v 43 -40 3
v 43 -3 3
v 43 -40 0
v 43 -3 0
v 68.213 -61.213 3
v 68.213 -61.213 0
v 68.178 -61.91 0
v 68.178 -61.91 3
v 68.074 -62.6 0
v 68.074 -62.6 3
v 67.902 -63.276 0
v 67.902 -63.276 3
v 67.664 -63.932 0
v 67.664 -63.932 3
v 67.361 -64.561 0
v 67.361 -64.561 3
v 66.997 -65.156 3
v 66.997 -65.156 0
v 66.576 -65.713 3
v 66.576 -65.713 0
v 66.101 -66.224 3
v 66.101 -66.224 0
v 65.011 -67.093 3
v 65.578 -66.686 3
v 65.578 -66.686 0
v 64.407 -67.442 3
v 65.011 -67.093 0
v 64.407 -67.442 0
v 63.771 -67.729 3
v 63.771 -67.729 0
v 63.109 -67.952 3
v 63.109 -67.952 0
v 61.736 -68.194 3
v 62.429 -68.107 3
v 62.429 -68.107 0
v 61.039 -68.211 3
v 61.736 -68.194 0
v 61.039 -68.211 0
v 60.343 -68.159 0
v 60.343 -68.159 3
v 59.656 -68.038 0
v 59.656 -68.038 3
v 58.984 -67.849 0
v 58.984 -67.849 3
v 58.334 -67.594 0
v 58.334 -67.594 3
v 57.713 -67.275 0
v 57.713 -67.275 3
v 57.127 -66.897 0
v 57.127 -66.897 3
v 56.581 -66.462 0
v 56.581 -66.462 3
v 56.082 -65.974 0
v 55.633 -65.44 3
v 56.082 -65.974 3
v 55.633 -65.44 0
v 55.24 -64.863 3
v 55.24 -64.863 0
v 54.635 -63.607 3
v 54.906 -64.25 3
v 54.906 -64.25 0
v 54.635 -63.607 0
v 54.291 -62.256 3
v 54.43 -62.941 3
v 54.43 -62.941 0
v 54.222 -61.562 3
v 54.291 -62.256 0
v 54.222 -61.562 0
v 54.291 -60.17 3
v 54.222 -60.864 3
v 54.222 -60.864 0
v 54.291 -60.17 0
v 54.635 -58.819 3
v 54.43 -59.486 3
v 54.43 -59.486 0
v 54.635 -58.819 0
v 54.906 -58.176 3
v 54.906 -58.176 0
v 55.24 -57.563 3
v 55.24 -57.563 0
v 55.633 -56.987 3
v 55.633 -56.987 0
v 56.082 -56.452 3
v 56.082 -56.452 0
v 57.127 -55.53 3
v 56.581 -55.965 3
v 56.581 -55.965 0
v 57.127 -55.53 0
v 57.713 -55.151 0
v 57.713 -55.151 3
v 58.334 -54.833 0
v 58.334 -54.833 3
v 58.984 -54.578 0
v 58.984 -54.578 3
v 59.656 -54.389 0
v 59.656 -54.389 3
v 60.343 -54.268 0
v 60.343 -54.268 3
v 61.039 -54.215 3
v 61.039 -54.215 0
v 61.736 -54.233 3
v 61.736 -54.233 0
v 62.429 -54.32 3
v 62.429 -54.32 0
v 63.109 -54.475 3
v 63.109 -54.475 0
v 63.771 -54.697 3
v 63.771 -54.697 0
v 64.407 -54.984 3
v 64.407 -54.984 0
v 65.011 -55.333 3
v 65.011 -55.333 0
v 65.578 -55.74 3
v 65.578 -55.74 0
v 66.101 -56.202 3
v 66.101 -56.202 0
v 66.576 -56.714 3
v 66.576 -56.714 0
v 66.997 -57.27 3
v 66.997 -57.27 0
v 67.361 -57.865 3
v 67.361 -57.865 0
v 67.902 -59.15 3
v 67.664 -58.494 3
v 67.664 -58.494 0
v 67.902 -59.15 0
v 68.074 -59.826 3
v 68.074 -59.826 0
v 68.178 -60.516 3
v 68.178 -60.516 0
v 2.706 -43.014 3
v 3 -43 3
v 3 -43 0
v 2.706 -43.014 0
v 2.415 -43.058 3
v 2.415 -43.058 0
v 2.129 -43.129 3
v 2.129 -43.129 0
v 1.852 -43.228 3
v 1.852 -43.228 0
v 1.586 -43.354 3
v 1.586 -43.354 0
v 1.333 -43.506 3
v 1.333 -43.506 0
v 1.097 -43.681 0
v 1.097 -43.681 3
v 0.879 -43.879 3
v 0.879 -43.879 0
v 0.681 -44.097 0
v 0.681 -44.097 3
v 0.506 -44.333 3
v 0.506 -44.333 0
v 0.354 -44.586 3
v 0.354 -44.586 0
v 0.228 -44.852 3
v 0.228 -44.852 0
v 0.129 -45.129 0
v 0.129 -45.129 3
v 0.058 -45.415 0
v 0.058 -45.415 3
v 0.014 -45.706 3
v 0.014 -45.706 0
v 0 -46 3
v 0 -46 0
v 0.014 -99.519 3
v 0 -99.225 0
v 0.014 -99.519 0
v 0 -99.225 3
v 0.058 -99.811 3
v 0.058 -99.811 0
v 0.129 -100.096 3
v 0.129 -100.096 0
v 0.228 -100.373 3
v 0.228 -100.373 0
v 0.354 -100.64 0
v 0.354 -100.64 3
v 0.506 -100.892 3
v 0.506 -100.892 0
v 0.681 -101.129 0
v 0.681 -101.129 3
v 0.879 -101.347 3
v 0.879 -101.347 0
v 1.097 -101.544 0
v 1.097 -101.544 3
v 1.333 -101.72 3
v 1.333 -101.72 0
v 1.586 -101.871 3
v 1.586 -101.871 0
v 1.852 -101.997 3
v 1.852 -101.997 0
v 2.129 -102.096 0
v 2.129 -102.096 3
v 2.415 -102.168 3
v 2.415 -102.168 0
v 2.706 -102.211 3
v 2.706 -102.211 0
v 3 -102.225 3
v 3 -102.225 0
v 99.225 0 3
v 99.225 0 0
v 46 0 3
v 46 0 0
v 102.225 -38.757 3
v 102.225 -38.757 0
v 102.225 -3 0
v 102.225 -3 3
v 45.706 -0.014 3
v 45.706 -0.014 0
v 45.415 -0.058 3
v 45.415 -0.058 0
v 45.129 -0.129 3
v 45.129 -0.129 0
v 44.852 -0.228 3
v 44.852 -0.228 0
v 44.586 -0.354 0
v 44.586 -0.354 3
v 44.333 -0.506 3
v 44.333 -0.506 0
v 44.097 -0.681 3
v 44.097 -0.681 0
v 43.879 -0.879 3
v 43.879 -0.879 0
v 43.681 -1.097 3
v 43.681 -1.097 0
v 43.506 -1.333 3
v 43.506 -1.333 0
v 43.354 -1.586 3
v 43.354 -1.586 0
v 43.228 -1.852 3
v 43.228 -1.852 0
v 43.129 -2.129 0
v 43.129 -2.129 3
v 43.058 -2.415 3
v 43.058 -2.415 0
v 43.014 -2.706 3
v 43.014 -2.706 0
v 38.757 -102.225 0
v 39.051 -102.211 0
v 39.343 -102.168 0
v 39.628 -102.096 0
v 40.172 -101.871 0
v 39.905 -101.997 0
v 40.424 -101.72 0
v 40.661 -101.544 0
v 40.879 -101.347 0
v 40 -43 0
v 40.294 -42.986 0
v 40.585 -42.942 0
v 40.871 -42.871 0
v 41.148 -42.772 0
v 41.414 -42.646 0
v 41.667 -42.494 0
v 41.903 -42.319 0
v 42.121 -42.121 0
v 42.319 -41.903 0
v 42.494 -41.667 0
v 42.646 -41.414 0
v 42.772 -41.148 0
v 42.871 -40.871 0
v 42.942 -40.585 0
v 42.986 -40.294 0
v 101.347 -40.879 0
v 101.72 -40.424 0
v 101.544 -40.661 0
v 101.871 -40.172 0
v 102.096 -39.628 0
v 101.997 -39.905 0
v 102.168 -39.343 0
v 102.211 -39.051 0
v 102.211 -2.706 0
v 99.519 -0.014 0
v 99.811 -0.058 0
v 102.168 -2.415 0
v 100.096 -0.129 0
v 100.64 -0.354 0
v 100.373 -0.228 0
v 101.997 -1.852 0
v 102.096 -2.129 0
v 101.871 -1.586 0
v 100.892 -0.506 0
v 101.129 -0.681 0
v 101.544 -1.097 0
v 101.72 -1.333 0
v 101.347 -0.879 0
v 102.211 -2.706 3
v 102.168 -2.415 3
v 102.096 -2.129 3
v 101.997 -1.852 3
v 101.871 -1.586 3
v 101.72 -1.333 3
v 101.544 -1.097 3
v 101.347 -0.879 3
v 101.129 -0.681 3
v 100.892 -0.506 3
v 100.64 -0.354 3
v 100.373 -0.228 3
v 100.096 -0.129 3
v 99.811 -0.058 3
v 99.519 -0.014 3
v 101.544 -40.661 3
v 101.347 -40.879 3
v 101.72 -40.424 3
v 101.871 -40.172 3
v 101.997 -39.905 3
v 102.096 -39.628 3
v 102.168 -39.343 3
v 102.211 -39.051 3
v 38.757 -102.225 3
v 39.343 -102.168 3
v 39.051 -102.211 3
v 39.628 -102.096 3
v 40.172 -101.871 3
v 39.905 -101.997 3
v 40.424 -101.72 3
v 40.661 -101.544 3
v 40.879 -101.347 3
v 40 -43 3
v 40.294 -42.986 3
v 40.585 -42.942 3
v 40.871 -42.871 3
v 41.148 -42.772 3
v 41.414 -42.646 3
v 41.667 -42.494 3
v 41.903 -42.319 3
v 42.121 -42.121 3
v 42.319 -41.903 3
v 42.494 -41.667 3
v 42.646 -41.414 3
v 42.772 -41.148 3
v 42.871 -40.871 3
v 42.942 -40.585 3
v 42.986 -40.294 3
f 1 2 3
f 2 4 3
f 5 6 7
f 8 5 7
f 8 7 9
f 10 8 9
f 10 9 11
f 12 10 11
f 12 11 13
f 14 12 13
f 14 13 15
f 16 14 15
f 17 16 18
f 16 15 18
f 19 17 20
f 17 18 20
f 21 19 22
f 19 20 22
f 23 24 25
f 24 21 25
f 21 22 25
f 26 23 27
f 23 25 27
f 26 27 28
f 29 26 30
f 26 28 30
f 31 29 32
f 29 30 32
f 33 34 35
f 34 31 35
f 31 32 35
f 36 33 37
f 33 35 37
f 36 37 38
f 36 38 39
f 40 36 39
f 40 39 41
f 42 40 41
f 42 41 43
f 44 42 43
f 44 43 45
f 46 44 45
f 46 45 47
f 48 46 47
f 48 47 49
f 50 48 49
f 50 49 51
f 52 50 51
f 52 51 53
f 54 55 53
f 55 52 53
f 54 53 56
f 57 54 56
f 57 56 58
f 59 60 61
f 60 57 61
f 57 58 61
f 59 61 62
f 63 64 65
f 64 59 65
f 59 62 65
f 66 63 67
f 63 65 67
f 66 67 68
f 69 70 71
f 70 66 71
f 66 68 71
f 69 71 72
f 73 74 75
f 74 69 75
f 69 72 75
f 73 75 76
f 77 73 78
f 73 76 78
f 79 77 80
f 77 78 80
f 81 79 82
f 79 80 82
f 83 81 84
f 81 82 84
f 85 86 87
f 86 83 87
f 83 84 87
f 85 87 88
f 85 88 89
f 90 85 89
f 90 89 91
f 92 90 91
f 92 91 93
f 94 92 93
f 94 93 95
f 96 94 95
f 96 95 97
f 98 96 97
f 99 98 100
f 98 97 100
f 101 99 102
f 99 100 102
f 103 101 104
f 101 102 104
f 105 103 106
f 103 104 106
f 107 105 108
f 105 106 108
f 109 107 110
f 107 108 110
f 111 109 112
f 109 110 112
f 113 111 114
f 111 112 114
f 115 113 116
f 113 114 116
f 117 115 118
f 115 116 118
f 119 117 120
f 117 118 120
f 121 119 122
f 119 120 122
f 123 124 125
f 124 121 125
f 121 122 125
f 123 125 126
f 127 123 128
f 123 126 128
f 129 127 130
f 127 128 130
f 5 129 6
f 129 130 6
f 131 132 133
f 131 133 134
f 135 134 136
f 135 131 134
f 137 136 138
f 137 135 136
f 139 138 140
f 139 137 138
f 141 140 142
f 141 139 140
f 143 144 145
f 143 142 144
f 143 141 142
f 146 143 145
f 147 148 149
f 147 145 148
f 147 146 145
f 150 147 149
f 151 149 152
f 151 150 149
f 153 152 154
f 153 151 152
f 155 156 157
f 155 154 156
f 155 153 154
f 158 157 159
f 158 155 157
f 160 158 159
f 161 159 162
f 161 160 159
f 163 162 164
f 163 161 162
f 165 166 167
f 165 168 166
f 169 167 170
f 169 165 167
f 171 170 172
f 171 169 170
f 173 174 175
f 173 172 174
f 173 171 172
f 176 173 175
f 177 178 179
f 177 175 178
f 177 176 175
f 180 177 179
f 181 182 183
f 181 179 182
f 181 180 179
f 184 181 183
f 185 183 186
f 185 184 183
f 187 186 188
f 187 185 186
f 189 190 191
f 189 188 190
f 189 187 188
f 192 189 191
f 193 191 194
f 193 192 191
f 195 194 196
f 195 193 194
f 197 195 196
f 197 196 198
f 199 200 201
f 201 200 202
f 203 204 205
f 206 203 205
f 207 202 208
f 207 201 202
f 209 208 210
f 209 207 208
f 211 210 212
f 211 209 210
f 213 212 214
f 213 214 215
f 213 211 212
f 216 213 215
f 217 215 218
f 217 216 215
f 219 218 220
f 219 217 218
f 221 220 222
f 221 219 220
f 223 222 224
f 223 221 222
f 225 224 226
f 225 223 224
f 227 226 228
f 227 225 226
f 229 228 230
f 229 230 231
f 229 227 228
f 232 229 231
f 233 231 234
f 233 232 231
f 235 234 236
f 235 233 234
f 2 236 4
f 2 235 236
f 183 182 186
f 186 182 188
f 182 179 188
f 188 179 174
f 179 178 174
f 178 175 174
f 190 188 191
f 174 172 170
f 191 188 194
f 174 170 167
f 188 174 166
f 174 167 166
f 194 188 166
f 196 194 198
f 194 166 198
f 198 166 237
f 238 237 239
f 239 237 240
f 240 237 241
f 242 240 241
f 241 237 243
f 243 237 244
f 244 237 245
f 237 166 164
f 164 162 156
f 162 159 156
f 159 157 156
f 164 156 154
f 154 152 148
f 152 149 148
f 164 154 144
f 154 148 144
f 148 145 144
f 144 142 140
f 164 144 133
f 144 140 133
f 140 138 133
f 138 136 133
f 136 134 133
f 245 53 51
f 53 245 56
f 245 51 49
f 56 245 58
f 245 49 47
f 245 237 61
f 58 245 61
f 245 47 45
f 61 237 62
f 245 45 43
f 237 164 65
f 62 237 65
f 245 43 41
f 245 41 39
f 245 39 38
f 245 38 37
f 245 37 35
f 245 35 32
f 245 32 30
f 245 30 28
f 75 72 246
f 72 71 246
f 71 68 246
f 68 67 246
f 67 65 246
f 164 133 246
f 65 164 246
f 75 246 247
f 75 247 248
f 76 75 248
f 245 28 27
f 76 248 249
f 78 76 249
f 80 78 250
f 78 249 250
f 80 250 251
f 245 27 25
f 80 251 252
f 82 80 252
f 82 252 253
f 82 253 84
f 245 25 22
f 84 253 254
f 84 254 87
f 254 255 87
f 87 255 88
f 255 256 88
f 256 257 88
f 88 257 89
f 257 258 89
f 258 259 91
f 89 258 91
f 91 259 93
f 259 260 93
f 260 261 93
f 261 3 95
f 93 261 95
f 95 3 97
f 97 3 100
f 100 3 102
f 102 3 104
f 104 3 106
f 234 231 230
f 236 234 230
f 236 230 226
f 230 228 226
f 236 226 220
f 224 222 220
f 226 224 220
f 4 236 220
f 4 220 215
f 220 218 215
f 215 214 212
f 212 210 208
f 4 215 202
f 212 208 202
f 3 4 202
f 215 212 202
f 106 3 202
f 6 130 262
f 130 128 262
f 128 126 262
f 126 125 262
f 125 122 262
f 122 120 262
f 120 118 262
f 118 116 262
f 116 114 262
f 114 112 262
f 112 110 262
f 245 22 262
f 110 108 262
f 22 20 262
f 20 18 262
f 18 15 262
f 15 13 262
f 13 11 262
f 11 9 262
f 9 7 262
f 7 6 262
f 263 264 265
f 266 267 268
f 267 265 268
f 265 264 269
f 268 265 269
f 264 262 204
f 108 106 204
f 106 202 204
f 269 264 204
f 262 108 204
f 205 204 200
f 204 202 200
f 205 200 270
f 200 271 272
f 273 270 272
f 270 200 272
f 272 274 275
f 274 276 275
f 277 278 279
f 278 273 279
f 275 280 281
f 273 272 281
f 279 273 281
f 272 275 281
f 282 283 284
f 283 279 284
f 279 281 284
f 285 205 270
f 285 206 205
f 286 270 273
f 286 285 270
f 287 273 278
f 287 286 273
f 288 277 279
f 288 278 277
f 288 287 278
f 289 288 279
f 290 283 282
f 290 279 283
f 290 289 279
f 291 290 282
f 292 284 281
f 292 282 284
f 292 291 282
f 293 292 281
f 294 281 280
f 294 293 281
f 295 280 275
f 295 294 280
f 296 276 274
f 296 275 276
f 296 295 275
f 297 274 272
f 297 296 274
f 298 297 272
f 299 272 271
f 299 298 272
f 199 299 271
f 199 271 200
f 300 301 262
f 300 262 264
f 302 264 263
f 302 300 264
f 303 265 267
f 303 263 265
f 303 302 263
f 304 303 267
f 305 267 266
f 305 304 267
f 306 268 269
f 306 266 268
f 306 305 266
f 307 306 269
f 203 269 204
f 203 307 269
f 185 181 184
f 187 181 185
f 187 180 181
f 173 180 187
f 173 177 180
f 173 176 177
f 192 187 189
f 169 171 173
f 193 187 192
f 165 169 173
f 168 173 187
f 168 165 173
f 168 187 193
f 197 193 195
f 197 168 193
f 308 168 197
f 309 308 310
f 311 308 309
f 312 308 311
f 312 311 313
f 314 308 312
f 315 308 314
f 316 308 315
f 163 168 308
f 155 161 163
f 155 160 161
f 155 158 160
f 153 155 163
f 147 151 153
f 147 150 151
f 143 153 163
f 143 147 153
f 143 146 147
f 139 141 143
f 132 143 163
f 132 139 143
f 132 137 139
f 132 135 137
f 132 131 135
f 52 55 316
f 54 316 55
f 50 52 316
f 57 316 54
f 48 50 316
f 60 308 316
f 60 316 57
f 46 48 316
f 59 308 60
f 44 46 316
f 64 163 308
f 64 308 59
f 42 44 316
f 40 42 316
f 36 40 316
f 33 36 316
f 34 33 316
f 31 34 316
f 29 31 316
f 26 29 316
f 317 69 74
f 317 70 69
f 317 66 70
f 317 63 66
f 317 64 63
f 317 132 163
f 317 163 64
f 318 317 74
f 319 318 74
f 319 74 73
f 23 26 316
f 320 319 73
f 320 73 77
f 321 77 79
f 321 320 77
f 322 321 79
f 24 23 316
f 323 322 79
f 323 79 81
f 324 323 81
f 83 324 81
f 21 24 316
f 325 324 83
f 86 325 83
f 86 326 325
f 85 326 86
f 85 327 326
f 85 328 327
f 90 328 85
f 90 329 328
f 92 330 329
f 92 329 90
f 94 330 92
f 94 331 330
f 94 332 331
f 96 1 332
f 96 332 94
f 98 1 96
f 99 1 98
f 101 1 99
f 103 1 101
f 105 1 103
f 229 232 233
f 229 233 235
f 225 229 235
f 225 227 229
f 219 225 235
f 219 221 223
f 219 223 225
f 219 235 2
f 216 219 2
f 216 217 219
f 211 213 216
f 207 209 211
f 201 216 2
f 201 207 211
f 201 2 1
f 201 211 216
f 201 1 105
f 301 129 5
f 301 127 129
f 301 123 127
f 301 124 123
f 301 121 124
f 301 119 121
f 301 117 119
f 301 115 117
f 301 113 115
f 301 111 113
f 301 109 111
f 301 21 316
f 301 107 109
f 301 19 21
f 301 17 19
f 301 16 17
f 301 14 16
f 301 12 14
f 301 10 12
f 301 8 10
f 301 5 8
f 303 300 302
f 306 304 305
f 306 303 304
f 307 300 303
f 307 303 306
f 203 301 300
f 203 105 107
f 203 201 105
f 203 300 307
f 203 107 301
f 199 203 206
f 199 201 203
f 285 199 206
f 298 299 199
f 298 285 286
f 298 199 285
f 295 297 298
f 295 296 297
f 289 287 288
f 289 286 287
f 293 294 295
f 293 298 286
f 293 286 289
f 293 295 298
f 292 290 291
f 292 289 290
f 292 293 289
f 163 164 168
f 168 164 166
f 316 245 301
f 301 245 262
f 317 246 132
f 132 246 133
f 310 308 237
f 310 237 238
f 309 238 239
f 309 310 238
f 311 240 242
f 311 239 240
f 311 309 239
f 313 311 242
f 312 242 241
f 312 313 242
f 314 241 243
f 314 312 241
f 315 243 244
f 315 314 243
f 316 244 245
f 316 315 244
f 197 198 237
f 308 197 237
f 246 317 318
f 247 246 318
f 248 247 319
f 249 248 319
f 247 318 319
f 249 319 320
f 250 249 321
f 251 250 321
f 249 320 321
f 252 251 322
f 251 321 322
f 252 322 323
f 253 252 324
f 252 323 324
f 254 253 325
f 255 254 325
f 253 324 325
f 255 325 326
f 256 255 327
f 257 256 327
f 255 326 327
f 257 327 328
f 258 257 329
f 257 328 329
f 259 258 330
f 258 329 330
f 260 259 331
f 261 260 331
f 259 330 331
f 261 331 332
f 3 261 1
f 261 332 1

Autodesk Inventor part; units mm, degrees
ref_plane "YZ Plane" through (0, 0, 0) normal (1, 0, 0) x (0, 1, 0)
ref_plane "XZ Plane" through (0, 0, 0) normal (0, 1, 0) x (-1, 0, 0)
ref_plane "XY Plane" through (0, 0, 0) normal (0, 0, 1) x (1, 0, 0)
sketch "Sketch2" plane through (0, 0, 0) normal (0, 0, 1) x (1, 0, 0)
  line L0 (0, 0) -> (40, 0) construction
  line L1 (40, 0) -> (40, -40) construction
  line L2 (40, -40) -> (0, -40) construction
  line L3 (0, -40) -> (0, 0) construction
  line L4 (43, 0) -> (43, -43)
  line L5 (43, -43) -> (0, -43)
  line L6 (0, -43) -> (0, -102.2254)
  line L7 (0, -102.2254) -> (40, -102.2254)
  line L8 (40, -102.2254) -> (102.2254, -40)
  line L9 (102.2254, -40) -> (102.2254, 0)
  line L10 (102.2254, 0) -> (43, 0)
  line L11 (43, -43) -> (71.1127, -71.1127) construction
  circle A0 centre (61.2132, -61.2132) radius 7
  dimension "d7" = 40
  dimension "d8" = 40
  dimension "d9" = 3
  dimension "d10" = 3
  dimension "d11" = 14
  dimension "d12" = 30
  dimension "d13" = 14
extrude "Plate2" add sketch "Sketch2" along normal blind 3
fillet "Corner Round3" radius 3 7 edges at (0, -102.2254, 1.5) (0, -43, 1.5) (43, -43, 1.5) (43, 0, 1.5) (102.2254, 0, 1.5) (102.2254, -40, 1.5) (40, -102.2254, 1.5)
feature "Corner Round4" [suppressed]
sketch "Sketch3" plane through (43, -103.468, 3) normal (-0.7071068, 0.7071068, 0) x (-0.7071068, -0.7071068, 0)
  line L0 (-85.5147, 0) -> (0, 0)
  line L1 (0, 0) -> (0, -20)
  line L2 (0, -20) -> (-85.5147, -20)
  line L3 (-85.5147, -20) -> (-85.5147, 0)
equation "\"d8\" = d7"
equation "\"d10\" = d9"
equation "\"d13\" = d11"
equation "\"d14\" = Thickness"
equation "\"BendReliefWidth\" = Thickness"
equation "\"BendReliefDepth\" = 0.5 * Thickness"
equation "\"CornerReliefSize\" = 4 * Thickness"
equation "\"MinimumRemnant\" = 2 * Thickness"
equation "\"TransitionRadius\" = BendRadius"
equation "\"JacobiRadiusSize\" = BendRadius"
equation "\"GapSize\" = Thickness"
equation "\"Thickness\" = 3"
equation "\"BendRadius\" = 5"
properties part number "GNH 081 leg support" material "Stainless Steel"
